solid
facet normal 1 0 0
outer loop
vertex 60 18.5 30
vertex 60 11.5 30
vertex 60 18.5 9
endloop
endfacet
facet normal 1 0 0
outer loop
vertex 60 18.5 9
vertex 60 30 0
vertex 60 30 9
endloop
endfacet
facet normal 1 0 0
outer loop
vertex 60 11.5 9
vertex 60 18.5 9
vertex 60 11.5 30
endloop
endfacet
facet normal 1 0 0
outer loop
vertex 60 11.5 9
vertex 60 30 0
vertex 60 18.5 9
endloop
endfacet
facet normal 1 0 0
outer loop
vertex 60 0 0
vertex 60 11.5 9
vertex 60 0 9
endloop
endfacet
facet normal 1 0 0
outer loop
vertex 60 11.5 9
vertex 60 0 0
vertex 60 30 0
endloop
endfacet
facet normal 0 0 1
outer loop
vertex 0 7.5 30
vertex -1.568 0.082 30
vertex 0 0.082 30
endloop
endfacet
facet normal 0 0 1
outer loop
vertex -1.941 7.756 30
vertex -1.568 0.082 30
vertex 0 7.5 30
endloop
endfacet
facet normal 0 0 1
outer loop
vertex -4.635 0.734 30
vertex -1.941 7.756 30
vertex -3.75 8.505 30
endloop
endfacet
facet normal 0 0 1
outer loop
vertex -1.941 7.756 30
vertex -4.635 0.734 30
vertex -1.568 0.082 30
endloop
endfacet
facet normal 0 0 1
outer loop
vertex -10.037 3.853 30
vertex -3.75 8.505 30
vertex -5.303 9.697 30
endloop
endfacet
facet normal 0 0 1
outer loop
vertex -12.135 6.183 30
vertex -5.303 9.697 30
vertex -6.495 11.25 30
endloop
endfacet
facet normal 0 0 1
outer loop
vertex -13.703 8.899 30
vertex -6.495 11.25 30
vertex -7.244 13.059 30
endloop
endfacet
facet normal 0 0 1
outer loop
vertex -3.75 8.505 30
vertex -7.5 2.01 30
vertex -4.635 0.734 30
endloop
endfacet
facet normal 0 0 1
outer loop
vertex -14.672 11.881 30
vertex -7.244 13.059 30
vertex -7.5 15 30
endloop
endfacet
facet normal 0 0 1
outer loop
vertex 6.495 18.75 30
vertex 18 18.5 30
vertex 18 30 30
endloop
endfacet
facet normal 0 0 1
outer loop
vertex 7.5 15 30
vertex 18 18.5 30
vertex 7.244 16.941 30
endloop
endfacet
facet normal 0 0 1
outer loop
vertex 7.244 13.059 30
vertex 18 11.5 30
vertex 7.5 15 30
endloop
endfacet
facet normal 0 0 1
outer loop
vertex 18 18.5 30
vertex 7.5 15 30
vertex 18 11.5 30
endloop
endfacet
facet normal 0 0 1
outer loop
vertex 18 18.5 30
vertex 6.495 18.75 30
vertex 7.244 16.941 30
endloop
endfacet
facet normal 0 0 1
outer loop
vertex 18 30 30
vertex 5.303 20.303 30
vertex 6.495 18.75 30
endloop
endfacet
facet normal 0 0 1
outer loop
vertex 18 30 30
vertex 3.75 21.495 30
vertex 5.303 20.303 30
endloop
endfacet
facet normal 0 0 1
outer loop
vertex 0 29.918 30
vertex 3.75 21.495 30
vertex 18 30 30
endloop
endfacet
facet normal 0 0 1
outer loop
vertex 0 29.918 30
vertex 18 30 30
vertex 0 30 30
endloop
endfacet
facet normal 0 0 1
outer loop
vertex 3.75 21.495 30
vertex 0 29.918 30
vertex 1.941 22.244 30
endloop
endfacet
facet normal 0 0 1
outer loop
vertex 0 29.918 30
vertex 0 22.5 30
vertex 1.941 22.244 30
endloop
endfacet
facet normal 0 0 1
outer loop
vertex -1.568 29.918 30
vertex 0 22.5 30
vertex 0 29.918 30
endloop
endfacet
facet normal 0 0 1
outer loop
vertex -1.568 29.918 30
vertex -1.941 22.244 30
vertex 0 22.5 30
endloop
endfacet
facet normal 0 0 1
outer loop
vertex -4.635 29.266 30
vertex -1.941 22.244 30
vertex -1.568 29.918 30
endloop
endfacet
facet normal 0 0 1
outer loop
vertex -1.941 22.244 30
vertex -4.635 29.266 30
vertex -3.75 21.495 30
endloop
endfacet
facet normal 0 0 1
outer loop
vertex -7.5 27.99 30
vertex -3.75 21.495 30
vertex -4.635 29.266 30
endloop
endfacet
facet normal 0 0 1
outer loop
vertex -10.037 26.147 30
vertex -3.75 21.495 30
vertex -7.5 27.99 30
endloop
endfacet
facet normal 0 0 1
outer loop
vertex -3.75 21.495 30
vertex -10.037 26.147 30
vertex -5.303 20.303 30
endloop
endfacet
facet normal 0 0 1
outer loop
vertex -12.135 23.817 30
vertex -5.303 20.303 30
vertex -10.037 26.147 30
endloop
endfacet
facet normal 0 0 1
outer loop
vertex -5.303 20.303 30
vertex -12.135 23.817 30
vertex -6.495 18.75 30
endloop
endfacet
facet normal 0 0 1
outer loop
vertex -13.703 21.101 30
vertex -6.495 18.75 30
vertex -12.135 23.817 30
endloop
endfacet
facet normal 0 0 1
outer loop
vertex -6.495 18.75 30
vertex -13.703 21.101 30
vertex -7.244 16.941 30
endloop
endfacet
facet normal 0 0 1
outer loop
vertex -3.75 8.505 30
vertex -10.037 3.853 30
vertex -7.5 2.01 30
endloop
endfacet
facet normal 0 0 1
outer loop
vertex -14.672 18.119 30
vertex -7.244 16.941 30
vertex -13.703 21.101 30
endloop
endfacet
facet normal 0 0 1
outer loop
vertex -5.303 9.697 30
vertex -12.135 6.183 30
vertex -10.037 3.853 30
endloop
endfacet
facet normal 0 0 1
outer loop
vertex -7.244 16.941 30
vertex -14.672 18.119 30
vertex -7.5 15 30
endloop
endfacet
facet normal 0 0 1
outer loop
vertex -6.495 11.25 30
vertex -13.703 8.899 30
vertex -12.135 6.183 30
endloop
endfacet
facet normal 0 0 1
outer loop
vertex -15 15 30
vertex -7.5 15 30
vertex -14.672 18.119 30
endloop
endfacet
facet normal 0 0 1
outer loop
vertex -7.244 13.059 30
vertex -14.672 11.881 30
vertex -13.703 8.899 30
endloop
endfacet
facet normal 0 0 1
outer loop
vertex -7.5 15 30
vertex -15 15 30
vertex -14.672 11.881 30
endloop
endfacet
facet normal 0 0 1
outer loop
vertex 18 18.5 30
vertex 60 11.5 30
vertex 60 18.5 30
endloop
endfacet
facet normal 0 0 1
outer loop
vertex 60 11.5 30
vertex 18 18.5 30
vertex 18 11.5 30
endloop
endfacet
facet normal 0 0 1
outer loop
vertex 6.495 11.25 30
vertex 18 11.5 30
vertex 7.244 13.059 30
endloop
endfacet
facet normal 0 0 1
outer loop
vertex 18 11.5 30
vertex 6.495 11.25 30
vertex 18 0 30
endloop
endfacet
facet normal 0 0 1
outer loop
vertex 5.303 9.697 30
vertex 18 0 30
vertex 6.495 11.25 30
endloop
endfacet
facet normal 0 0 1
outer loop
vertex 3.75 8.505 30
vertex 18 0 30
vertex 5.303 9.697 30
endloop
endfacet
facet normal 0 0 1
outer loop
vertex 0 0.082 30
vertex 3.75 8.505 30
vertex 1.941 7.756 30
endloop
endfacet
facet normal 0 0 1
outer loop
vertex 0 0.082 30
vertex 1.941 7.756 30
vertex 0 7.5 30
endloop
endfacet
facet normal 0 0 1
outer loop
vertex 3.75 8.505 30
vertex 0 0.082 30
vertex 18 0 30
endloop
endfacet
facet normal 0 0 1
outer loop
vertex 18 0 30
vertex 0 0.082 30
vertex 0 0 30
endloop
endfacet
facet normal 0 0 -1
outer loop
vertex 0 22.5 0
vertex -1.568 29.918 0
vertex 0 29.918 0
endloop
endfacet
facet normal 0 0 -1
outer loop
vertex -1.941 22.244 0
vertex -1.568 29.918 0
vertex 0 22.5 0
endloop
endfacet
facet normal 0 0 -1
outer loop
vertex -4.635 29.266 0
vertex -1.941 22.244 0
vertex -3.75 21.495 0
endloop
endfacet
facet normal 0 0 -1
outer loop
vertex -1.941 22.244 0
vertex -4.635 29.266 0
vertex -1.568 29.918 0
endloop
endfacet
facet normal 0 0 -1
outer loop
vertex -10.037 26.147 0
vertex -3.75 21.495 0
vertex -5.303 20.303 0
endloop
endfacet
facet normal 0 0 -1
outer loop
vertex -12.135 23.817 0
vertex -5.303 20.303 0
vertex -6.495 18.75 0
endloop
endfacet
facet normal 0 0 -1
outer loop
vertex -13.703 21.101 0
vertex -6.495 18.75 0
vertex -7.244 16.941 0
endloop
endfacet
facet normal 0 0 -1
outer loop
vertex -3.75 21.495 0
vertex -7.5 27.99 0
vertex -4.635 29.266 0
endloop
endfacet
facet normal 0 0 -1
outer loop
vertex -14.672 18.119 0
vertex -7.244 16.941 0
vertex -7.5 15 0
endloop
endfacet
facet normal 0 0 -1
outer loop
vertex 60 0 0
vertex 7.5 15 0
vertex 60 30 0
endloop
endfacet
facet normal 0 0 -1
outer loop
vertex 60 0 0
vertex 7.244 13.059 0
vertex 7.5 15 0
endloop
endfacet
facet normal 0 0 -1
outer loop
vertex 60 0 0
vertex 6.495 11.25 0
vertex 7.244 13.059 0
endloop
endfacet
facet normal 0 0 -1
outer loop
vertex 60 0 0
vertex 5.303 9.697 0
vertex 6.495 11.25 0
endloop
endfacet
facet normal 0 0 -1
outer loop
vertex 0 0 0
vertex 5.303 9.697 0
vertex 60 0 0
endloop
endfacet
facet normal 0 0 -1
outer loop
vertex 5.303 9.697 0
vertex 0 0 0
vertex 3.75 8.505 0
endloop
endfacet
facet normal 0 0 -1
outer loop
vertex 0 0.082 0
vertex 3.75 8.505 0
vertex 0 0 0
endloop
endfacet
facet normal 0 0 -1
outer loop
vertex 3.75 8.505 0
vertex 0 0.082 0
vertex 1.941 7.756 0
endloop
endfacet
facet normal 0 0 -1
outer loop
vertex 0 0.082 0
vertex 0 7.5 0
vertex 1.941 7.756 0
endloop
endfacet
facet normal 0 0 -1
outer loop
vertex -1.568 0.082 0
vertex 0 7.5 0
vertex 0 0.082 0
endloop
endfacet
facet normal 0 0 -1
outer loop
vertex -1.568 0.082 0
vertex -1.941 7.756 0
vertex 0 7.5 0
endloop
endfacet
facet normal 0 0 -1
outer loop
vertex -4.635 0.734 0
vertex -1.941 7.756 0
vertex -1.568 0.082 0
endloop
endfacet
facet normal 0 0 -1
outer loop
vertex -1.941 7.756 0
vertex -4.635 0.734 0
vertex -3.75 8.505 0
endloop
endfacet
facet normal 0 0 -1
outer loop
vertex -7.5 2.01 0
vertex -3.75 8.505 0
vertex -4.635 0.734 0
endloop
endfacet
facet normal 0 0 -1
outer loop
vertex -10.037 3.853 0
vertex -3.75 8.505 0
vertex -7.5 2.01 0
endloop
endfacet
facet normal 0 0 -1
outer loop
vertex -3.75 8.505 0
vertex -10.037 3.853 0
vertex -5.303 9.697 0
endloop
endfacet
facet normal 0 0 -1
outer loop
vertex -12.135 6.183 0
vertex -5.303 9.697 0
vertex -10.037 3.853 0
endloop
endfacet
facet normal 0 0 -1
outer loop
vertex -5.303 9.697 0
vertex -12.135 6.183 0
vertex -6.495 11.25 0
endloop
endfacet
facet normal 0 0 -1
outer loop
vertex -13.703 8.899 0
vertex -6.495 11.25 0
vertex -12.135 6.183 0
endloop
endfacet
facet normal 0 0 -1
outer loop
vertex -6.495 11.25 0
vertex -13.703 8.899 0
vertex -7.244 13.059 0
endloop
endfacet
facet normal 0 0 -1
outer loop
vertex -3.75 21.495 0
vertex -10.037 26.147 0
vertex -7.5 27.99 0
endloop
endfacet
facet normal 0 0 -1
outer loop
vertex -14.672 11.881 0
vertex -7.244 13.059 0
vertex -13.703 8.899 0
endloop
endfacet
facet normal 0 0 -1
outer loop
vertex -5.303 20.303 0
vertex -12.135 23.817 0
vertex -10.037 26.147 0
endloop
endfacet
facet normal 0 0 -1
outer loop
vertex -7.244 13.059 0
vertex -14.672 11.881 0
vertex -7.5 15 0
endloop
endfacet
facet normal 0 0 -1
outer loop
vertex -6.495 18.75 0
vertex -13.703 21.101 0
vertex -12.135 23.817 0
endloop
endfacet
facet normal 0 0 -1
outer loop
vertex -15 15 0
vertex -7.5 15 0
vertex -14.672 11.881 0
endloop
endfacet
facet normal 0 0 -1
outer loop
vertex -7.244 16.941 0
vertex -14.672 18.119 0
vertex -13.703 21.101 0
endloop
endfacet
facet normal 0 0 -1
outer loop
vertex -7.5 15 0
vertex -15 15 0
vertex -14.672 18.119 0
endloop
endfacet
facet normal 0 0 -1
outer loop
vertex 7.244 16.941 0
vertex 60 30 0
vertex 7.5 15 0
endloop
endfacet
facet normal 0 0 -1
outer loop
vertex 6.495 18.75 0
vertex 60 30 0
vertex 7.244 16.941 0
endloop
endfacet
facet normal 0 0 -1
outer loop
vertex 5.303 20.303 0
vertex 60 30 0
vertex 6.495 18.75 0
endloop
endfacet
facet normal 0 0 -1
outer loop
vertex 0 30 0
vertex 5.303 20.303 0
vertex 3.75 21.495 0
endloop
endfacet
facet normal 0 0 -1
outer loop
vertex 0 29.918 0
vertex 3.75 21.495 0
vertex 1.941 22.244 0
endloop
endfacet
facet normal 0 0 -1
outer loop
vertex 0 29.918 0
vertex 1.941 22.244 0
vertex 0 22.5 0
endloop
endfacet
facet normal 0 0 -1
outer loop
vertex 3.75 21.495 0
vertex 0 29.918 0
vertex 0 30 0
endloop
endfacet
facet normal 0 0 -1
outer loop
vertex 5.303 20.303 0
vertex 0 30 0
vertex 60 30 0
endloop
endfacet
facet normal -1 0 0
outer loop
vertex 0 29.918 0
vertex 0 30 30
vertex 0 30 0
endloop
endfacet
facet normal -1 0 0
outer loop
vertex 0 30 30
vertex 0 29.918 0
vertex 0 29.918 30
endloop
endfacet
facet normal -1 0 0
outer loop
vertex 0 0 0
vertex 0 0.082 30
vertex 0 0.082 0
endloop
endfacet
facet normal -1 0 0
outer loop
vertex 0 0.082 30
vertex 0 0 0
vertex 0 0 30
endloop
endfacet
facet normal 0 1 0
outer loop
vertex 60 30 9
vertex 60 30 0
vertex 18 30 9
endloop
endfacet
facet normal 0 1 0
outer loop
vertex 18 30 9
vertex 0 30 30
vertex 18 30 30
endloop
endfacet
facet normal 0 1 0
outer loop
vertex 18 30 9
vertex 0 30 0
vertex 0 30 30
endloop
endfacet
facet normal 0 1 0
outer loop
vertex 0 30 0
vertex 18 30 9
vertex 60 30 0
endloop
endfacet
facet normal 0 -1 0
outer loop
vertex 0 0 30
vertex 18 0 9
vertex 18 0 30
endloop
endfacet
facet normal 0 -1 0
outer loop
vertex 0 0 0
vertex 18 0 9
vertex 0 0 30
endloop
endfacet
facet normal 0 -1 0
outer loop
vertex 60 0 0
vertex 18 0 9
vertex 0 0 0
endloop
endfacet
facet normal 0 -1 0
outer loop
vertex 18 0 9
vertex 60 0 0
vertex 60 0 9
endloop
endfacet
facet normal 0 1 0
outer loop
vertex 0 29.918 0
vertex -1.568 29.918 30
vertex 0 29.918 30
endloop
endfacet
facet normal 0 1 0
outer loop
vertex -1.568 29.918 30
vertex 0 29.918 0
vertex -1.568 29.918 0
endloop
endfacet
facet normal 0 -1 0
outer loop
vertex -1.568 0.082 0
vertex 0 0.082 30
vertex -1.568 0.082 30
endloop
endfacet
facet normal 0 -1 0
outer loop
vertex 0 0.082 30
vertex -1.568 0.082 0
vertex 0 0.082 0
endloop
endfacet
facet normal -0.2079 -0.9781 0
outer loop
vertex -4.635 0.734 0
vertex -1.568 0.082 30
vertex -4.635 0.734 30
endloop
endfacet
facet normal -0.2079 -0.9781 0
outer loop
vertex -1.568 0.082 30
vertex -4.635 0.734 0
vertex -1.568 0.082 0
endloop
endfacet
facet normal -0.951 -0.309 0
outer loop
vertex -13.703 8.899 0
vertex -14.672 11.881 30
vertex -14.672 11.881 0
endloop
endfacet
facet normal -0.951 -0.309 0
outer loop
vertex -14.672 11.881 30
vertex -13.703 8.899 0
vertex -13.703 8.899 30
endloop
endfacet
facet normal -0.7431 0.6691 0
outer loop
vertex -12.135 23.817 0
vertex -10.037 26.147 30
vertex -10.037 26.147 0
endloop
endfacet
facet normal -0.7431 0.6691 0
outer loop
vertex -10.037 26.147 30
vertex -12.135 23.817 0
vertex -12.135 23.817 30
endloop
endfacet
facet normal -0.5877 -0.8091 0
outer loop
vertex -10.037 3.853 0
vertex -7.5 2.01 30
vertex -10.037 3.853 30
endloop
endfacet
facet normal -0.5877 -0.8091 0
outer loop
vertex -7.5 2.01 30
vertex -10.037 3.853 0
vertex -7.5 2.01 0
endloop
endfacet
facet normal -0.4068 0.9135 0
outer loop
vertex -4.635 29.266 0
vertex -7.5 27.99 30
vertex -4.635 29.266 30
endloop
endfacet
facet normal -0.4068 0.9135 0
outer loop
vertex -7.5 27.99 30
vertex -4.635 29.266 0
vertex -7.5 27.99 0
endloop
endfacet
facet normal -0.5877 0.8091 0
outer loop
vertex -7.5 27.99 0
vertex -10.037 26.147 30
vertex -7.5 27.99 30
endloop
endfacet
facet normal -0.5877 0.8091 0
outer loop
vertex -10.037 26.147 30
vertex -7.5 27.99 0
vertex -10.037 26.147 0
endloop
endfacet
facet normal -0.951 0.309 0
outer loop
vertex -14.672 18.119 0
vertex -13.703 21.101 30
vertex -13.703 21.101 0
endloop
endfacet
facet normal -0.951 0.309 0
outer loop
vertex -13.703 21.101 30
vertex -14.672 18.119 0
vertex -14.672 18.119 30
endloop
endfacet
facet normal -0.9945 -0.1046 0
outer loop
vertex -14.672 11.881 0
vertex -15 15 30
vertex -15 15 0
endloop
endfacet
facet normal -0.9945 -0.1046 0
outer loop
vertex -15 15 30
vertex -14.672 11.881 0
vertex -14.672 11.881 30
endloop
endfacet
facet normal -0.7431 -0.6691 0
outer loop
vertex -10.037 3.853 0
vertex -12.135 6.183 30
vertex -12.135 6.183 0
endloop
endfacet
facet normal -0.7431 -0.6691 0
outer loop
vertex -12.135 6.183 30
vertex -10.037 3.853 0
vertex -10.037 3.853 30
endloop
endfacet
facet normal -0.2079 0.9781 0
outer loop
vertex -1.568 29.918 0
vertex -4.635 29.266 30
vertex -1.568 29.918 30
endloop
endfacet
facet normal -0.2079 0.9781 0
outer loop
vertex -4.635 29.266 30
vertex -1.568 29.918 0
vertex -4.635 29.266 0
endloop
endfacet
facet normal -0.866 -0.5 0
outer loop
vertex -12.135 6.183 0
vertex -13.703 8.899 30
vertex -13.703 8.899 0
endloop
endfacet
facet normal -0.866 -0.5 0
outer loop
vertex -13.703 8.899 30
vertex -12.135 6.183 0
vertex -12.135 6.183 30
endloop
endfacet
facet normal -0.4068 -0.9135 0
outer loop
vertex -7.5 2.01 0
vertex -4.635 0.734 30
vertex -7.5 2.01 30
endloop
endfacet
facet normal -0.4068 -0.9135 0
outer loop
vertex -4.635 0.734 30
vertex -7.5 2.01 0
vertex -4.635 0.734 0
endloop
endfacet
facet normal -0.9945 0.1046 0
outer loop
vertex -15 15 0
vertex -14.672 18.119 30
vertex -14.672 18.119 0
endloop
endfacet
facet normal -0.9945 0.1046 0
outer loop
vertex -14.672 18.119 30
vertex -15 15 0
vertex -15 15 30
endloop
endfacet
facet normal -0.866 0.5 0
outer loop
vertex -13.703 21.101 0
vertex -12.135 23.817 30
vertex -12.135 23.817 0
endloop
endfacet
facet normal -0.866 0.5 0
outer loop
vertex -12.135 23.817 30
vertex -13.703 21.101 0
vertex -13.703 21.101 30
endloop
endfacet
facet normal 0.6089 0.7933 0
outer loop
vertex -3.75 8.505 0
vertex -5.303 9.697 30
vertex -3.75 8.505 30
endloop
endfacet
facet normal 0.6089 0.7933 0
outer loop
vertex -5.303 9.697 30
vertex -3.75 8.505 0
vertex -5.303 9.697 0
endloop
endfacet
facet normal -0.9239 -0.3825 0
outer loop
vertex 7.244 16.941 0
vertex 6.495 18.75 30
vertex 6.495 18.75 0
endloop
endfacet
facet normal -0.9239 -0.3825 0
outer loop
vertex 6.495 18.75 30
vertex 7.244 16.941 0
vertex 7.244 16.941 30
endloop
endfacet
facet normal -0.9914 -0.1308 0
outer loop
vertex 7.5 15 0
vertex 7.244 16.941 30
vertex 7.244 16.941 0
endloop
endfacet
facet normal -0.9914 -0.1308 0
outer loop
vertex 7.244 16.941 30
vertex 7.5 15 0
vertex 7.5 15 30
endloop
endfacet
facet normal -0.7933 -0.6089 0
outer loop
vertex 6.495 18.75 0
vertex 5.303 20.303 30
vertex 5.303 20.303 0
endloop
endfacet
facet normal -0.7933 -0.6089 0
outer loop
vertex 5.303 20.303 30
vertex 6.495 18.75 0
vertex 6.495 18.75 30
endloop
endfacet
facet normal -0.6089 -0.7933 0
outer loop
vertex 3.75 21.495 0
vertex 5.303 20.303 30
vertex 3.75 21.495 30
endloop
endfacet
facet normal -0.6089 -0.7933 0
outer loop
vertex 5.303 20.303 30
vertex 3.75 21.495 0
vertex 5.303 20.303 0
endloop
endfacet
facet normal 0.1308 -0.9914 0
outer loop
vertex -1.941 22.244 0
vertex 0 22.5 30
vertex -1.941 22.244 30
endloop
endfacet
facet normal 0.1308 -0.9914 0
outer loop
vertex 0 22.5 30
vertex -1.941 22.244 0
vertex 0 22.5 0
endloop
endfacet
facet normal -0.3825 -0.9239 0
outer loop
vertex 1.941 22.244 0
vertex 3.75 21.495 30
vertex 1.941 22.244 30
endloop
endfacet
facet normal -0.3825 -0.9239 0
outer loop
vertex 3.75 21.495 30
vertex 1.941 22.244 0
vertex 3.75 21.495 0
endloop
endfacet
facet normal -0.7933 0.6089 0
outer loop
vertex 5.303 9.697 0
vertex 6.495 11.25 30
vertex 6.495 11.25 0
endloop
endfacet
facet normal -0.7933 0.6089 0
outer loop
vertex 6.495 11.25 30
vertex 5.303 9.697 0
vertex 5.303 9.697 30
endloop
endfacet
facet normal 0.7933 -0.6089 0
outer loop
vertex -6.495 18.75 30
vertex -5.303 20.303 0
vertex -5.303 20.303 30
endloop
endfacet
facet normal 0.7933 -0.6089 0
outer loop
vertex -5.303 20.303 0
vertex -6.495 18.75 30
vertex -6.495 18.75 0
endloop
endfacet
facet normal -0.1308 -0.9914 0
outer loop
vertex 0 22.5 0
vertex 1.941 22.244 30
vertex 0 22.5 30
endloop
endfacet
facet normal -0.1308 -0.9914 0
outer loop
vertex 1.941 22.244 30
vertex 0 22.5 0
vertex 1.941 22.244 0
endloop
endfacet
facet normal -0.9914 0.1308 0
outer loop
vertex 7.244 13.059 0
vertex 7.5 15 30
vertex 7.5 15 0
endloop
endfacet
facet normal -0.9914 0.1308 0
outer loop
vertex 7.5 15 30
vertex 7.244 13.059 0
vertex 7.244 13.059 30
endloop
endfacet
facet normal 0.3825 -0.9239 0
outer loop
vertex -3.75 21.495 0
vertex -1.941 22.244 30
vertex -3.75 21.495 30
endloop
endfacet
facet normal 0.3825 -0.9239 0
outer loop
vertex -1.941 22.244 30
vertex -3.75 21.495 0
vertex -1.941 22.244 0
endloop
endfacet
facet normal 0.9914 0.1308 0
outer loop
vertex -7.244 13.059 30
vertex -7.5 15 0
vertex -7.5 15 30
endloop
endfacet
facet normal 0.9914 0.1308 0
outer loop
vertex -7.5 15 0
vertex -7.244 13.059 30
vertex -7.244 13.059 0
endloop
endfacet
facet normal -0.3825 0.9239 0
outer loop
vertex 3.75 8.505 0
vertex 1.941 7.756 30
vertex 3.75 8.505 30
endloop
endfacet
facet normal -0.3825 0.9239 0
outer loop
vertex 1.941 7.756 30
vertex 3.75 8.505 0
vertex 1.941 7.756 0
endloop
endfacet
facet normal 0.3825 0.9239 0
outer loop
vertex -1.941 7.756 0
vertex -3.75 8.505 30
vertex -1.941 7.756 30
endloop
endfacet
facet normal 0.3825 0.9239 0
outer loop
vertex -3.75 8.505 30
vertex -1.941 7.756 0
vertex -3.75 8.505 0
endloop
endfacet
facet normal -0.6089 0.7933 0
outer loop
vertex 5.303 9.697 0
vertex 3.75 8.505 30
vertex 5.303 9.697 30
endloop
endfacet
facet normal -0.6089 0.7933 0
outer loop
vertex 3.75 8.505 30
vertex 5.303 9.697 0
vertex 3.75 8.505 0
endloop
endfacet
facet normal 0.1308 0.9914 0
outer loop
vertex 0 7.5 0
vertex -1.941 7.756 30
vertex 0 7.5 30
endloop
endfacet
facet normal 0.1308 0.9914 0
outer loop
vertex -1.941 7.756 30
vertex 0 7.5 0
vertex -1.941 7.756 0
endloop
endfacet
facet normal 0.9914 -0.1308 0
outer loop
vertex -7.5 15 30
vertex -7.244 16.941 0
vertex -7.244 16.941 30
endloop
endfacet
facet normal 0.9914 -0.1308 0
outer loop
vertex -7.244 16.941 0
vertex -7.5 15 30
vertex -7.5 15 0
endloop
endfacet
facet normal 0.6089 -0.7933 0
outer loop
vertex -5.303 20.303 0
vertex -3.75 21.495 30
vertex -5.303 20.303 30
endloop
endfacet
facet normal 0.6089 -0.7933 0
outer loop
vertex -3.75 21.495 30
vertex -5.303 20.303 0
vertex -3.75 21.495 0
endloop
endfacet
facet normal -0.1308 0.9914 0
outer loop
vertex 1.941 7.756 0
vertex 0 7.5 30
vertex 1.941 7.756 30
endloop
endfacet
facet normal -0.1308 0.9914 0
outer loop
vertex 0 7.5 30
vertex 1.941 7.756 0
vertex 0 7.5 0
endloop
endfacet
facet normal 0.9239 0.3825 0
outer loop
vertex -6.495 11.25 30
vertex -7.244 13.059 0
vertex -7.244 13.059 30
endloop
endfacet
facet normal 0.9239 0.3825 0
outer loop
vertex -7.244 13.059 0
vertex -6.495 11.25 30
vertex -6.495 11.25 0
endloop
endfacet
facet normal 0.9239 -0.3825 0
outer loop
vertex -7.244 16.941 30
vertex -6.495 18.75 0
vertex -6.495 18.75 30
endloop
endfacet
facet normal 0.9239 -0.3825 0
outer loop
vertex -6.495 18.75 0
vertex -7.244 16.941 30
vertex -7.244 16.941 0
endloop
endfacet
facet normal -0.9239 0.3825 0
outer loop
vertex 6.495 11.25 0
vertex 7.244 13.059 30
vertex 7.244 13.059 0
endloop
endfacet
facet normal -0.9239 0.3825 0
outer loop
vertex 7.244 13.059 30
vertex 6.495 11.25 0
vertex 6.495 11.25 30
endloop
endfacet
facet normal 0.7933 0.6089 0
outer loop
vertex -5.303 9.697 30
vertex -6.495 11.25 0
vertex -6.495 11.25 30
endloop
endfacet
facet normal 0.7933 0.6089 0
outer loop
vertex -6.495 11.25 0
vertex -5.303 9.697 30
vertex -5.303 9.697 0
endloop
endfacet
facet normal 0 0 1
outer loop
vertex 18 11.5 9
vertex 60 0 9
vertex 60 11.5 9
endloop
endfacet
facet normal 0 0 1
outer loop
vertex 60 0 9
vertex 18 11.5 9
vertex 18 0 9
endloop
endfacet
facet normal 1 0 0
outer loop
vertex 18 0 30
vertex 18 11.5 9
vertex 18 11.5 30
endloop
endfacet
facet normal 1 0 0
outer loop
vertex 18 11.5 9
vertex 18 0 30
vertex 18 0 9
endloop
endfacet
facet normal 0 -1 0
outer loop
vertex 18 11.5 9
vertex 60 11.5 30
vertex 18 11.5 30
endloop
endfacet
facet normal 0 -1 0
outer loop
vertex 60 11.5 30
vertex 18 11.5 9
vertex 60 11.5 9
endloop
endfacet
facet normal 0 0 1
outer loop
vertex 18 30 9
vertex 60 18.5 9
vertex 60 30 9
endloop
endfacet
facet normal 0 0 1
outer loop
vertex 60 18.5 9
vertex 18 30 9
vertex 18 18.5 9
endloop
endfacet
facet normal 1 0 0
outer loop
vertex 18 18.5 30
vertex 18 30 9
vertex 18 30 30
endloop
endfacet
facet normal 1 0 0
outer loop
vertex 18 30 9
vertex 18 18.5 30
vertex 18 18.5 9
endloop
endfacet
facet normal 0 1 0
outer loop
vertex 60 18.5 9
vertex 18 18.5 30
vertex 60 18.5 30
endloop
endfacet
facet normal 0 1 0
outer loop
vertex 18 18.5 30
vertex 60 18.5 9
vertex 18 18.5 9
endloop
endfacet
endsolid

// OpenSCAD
// width
width = 30; // [10:50]
height = 30;
length = 75;
hole = 7.5;
ridge = 7;
bottom = 9;
setback = 18;

difference() {

	union(){
		cube([length-width/2, width, height]);
		translate([0, width/2, 0]){
			cylinder(height, d = width);
		}
	}

	translate([0, width/2, -1]){
			cylinder(height+2, r = hole);
	}
	
	translate([setback, -1, bottom]){
			cube([length, (width-ridge+2)/2, height]);
	}
	translate([setback, width-(width-ridge)/2, bottom]){
			cube([length, (width-ridge+2)/2, height]);
	}
}
